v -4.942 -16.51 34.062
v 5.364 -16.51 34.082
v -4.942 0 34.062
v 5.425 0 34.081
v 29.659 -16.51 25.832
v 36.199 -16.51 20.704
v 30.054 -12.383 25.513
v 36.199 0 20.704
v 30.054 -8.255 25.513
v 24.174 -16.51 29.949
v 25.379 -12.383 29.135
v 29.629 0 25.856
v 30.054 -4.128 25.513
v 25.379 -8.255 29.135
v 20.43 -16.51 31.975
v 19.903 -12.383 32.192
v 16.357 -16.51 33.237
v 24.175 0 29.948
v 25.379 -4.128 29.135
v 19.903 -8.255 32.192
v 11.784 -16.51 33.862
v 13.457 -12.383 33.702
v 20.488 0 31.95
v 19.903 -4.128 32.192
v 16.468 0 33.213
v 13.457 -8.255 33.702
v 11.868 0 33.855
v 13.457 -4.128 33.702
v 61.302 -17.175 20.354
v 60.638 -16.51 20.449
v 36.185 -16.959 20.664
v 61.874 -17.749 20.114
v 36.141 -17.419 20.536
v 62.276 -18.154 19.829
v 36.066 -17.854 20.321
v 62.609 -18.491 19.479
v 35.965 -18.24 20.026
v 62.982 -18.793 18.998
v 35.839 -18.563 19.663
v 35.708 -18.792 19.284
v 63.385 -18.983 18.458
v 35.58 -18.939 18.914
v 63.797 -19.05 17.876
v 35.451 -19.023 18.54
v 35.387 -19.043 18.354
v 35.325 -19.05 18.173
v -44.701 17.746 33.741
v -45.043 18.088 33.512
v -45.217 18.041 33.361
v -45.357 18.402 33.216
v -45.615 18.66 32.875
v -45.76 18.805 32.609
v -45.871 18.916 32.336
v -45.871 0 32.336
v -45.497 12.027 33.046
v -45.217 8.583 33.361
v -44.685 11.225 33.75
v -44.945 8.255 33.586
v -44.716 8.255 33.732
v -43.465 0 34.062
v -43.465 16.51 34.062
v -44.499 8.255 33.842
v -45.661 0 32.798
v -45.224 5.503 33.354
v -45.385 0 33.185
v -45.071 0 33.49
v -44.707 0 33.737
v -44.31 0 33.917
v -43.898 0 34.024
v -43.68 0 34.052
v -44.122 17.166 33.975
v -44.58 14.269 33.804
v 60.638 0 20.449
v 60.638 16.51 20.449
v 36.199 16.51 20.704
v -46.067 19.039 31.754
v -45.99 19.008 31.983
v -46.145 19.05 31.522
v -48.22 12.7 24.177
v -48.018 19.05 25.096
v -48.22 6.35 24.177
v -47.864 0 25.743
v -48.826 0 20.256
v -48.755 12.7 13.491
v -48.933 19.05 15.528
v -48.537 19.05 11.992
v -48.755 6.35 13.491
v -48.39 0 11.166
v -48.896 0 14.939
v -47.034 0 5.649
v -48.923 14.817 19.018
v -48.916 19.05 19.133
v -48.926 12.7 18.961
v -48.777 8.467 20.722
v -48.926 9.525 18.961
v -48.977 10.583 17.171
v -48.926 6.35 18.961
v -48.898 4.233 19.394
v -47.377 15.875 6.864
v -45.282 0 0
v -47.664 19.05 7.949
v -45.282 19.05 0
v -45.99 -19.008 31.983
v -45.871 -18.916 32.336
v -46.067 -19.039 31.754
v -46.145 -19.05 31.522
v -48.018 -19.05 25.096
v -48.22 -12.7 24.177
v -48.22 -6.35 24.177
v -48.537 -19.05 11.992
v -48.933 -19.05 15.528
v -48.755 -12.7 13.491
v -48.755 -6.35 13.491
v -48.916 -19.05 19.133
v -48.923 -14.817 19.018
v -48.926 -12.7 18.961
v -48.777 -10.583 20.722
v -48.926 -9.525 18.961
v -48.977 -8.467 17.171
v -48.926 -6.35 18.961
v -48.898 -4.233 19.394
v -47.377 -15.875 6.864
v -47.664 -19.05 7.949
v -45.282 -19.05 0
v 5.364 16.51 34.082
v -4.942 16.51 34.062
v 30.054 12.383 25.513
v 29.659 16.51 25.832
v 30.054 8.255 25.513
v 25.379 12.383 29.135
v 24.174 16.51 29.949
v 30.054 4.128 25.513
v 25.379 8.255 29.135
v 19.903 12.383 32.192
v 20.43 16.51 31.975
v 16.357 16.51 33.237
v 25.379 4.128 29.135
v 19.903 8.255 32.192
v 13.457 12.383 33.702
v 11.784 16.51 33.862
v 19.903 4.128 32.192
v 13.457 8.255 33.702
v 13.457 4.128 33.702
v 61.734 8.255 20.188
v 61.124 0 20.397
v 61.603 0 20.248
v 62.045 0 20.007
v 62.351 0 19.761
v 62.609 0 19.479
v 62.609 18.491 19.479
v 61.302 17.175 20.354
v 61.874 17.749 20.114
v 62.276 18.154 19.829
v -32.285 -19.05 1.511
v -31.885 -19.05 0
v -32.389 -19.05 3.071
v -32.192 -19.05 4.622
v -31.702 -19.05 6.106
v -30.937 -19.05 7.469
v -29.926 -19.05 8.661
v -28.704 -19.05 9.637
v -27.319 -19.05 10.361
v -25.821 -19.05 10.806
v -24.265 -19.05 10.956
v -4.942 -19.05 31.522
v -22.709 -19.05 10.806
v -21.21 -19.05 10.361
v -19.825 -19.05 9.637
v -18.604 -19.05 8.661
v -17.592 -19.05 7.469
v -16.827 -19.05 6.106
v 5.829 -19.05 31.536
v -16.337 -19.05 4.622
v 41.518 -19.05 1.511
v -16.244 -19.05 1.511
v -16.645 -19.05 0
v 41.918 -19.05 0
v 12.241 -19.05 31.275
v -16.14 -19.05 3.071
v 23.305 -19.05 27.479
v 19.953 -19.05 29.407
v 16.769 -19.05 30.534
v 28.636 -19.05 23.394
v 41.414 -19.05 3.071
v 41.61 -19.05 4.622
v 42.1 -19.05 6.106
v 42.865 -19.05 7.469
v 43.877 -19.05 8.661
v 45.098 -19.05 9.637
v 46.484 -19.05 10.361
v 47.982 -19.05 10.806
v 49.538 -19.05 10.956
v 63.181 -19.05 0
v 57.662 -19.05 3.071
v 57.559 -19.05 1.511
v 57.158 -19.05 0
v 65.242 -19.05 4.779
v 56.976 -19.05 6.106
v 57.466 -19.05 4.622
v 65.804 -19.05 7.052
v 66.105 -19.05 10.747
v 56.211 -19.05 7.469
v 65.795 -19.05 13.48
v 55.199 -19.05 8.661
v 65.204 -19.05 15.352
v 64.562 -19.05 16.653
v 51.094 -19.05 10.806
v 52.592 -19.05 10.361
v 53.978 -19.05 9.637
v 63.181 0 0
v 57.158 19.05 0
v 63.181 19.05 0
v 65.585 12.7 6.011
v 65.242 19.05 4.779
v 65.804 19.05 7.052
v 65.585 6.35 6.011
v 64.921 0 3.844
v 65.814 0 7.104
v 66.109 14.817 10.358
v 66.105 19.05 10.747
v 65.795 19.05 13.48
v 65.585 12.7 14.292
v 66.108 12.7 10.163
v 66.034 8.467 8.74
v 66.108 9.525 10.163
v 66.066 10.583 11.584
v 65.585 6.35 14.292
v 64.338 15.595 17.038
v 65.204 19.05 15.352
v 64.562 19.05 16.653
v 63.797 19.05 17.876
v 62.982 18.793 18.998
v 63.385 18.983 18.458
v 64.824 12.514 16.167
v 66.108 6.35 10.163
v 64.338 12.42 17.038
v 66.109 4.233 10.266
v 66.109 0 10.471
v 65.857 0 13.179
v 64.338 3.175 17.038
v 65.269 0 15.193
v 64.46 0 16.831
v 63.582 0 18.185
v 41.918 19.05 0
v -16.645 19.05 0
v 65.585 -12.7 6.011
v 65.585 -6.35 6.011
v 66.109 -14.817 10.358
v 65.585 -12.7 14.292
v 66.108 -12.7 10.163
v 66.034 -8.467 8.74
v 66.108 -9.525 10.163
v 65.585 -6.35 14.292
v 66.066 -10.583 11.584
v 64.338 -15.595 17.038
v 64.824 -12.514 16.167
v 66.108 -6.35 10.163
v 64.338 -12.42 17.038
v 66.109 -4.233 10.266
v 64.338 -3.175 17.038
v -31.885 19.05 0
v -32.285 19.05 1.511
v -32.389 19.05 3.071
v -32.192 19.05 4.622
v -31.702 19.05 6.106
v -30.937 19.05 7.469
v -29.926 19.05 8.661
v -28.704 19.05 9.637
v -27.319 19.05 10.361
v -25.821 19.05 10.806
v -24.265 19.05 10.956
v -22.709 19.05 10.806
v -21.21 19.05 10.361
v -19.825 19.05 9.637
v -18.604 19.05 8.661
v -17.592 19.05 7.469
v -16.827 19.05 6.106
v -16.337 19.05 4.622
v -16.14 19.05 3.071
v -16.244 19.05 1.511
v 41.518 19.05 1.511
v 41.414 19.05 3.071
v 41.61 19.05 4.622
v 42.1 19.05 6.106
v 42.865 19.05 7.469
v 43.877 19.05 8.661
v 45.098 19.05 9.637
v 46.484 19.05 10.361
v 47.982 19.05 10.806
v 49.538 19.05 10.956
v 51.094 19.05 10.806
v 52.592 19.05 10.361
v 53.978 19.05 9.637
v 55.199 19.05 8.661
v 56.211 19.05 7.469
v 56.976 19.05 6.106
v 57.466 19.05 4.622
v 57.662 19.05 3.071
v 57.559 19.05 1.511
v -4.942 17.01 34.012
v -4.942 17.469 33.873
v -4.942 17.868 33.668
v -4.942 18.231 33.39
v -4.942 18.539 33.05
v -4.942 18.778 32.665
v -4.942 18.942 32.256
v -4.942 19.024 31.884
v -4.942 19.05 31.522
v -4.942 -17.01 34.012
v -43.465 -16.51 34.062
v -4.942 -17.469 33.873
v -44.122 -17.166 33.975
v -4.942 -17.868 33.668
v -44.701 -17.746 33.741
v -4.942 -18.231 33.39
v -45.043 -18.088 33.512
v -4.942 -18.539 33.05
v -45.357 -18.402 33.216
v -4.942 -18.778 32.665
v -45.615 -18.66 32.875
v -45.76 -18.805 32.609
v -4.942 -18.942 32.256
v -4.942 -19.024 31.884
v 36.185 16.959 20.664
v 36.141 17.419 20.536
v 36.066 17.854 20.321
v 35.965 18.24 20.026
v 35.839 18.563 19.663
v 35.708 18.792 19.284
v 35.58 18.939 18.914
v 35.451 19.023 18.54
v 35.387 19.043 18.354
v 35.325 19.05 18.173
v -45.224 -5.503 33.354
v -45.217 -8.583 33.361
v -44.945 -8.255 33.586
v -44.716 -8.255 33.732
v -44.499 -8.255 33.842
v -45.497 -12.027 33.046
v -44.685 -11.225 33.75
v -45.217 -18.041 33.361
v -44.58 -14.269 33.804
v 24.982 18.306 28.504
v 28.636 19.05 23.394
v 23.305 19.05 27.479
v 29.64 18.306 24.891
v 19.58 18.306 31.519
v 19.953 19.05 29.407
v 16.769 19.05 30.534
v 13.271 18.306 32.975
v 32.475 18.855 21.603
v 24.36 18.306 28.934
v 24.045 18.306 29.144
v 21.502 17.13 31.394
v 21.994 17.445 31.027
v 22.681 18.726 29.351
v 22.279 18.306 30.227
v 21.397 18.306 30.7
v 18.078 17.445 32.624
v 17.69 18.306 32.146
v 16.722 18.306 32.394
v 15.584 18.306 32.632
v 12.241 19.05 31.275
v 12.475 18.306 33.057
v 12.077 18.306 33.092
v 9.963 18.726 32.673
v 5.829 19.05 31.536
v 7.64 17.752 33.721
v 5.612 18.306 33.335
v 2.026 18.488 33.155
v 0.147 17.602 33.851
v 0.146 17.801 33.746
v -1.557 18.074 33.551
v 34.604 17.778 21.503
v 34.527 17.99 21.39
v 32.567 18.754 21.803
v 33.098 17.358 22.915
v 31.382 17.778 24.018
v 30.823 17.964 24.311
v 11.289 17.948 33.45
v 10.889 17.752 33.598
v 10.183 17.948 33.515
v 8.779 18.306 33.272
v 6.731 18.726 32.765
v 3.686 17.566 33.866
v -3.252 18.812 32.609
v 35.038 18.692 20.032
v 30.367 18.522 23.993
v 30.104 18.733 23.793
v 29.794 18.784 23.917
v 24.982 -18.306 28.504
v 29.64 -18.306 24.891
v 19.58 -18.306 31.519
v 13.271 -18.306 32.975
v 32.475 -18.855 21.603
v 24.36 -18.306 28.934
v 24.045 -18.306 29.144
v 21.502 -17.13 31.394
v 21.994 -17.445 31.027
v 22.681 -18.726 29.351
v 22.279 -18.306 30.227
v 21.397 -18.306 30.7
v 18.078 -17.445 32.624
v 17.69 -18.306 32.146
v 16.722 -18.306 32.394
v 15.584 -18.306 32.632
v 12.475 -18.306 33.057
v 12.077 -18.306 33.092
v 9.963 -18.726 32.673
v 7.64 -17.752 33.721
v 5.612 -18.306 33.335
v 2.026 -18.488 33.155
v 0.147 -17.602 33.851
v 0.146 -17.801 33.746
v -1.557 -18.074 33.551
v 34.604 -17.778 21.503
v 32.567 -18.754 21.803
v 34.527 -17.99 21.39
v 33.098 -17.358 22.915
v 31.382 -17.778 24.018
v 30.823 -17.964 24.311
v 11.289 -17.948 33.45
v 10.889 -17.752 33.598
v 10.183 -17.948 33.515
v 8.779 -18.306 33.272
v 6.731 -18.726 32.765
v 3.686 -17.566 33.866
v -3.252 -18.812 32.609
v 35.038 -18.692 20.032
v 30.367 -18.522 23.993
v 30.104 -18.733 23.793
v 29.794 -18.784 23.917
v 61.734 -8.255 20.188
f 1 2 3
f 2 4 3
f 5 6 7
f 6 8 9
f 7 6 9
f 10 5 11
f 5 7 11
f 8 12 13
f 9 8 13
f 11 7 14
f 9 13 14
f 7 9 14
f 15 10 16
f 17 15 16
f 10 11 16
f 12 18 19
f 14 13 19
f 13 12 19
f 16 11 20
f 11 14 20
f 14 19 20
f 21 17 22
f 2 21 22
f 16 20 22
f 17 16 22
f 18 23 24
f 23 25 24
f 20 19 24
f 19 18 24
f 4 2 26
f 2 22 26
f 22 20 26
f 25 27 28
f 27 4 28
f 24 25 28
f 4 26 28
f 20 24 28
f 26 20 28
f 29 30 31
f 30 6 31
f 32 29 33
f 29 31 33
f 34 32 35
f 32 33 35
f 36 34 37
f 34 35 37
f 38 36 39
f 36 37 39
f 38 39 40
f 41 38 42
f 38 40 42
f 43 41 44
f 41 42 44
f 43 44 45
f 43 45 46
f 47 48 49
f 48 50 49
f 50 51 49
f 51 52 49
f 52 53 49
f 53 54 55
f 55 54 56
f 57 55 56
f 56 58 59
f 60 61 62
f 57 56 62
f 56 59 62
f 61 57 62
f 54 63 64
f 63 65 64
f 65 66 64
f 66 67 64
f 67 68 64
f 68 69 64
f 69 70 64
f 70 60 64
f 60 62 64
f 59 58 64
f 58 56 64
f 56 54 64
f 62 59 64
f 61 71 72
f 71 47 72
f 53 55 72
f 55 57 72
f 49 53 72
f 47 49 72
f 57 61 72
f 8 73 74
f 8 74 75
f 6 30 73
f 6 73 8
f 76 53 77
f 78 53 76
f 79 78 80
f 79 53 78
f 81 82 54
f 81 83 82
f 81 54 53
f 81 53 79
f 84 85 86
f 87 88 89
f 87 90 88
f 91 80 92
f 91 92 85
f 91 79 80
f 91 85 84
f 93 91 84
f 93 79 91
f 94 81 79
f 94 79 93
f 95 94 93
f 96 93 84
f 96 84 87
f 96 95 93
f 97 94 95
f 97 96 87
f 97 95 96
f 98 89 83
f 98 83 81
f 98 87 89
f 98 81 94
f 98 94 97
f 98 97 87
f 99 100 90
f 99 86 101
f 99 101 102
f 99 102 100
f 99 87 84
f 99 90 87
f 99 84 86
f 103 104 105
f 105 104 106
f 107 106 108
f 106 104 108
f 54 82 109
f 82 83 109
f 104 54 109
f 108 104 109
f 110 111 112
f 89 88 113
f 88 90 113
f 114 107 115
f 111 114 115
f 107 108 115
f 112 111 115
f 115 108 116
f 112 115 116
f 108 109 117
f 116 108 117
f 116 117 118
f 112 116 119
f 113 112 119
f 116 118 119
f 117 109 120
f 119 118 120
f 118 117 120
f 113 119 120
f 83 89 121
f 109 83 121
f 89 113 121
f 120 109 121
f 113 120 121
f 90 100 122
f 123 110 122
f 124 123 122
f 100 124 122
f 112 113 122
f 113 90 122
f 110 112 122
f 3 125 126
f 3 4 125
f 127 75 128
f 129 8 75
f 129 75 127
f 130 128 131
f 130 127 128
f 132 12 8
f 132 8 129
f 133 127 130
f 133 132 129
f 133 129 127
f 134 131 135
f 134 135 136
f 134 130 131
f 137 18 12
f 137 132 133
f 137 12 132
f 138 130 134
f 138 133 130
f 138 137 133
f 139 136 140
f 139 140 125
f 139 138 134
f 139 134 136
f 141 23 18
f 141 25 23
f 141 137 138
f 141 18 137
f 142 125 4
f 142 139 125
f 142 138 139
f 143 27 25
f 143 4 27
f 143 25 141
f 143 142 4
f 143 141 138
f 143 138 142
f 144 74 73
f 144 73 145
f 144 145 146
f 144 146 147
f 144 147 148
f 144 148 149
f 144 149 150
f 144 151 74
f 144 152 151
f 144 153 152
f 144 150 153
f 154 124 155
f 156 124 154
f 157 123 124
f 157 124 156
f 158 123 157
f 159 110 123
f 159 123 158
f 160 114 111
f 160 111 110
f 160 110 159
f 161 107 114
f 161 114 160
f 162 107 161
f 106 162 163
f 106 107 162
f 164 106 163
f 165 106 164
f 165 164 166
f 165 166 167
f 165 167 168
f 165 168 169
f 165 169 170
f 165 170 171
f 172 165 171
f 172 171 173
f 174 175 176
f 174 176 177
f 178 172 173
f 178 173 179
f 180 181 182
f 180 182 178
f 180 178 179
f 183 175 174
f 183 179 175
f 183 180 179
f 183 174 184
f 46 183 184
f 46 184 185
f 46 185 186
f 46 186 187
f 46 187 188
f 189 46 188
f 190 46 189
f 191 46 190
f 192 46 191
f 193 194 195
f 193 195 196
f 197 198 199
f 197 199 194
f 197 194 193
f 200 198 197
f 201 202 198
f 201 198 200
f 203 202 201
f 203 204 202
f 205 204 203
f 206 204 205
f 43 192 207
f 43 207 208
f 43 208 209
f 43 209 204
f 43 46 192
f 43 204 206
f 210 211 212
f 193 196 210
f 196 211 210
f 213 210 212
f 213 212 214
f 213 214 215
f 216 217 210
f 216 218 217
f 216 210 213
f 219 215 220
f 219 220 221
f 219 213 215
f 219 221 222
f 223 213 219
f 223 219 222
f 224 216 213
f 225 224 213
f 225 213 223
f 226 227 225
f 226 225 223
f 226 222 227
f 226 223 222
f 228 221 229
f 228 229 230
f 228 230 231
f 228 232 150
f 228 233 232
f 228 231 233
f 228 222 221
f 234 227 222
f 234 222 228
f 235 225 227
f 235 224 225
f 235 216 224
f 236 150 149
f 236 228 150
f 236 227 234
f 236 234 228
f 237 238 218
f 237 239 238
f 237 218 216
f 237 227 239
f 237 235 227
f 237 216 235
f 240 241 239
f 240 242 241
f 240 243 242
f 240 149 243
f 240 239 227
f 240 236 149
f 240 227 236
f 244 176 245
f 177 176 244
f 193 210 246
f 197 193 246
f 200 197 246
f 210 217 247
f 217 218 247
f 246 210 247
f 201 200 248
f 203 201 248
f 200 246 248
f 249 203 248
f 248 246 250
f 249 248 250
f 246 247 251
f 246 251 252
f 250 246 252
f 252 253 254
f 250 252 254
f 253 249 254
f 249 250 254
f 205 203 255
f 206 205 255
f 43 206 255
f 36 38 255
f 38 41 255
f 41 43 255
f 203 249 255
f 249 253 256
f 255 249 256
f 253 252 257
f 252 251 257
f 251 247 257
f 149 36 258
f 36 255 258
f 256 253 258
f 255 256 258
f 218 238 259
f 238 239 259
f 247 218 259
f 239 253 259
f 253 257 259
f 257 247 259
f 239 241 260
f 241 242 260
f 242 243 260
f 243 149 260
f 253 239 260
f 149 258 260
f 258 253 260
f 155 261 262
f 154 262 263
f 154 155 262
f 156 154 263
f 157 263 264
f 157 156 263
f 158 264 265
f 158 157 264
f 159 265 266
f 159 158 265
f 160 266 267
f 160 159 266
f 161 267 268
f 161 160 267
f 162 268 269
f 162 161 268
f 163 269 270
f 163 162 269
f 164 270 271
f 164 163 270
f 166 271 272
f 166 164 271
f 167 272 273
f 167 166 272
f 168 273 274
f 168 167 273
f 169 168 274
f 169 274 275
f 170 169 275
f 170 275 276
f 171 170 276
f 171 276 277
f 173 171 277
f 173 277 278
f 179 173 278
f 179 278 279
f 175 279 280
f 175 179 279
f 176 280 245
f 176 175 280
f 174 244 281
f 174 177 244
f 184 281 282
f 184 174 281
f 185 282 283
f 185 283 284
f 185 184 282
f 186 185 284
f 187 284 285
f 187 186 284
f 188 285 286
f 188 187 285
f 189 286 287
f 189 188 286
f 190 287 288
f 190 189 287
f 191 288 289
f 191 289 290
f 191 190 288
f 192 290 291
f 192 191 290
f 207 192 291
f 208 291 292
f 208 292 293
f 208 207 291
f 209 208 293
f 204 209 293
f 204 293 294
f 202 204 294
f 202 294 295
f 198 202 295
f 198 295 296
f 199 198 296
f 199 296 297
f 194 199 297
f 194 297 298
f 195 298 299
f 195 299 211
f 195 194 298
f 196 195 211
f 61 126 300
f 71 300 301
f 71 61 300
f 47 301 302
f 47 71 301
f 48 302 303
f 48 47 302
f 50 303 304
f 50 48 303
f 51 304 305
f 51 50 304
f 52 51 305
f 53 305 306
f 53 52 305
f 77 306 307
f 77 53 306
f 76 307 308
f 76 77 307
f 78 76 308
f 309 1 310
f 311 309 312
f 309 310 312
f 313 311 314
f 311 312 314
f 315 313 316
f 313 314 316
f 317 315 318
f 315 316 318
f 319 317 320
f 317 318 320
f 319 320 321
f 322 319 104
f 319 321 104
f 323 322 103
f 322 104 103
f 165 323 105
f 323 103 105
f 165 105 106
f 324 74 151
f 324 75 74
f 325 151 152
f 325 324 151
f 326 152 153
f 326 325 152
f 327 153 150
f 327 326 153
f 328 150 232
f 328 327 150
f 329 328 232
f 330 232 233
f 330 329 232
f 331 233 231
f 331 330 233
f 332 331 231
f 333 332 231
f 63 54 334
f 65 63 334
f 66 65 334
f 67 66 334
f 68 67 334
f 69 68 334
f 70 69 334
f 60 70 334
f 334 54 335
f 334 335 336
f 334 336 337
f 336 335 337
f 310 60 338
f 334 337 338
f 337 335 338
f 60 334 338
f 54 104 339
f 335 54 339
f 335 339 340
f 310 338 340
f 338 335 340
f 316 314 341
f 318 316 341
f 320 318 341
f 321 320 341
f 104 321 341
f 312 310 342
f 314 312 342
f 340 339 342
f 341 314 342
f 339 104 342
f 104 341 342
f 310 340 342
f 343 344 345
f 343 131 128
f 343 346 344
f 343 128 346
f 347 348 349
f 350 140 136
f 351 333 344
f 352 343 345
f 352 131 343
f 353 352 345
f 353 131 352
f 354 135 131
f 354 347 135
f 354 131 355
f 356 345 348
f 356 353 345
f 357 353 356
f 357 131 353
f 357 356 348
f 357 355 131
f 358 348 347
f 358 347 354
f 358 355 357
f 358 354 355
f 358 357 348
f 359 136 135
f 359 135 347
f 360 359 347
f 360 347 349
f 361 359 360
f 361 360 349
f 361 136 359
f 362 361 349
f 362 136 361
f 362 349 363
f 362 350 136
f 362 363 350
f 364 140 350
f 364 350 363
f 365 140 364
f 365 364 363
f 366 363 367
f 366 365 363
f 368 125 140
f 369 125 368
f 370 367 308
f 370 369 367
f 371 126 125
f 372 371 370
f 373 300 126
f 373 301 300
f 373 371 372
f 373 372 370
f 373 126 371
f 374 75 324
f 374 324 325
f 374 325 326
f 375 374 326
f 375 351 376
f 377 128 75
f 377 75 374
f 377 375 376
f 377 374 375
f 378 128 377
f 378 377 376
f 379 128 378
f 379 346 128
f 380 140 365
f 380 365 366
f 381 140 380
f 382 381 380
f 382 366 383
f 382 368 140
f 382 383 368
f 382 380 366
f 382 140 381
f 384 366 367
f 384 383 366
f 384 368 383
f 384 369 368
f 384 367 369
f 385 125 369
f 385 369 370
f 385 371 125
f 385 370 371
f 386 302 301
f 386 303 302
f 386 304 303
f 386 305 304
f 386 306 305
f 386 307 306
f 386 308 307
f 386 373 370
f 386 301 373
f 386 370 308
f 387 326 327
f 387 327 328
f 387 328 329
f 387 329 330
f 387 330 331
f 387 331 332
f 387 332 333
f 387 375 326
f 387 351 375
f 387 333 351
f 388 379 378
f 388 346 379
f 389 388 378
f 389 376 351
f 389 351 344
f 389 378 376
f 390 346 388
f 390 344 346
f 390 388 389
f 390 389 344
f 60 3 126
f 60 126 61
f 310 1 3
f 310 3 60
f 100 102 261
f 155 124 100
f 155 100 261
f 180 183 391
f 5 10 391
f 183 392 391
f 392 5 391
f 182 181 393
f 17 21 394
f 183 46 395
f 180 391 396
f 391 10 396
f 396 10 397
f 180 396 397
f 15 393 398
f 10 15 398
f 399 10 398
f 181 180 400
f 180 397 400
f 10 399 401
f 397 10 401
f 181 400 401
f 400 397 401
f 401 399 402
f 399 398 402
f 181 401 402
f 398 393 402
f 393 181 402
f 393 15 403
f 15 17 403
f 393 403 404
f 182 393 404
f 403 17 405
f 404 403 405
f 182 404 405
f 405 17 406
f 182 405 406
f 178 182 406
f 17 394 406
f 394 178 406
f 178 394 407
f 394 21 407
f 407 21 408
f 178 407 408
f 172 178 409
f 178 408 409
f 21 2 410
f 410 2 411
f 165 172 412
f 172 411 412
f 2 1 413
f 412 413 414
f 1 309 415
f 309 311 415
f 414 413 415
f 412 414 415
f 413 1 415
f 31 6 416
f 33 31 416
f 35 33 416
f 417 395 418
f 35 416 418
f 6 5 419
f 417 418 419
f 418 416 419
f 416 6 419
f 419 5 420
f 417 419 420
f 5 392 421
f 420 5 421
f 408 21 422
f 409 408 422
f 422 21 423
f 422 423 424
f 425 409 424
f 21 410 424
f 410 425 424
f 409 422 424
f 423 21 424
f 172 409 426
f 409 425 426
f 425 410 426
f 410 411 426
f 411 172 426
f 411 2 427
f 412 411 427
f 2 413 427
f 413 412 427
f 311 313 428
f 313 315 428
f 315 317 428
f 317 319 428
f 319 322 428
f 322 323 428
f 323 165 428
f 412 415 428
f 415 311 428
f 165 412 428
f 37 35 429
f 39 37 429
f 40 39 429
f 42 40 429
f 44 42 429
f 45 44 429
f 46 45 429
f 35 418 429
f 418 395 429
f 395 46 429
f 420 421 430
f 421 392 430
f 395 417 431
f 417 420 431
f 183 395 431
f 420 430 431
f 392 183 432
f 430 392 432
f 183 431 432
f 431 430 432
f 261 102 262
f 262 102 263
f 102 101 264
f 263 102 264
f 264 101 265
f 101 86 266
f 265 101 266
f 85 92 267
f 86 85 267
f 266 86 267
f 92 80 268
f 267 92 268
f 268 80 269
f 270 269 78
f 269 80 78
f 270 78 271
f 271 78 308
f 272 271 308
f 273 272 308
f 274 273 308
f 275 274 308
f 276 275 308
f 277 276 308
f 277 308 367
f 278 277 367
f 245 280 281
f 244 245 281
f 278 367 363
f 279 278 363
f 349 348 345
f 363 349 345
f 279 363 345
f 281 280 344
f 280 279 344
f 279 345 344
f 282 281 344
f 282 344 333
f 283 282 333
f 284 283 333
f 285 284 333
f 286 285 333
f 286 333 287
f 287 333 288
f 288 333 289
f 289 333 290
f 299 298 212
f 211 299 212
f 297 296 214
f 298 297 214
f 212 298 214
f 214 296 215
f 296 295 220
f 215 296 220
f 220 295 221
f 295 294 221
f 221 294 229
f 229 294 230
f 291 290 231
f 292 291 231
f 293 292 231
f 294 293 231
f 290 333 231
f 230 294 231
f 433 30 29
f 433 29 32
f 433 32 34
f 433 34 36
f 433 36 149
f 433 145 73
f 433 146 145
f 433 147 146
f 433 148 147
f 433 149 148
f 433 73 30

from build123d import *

# Parameters (mm, degrees)
F1_DEPTH = 19.05
F2_R     = 2.54


# Not quite as in the source:
# - a feature of the source that left no trace in its solid (it failed there, or was rolled back) is left out
# - the program builds the solid bodies; features that only make, move or delete a surface that nothing else refers to are left out


with BuildPart() as f1:
    # F0 (on Front) → F1 (new body, symmetric)
    with BuildSketch(Plane.XZ):
        with BuildLine():
            Line((57.1580786184, 0), (63.1808337388, 0))
            add(Edge.make_bspline(
                [(63.1808337388, 0), (64.1070753603, 1.8610503512), (66.0809264552, 5.8270093279), (66.4899415159, 14.6578153912), (63.3565966702, 18.5563140043), (61.8450880558, 20.4369286596)],
                knots=[0, 0, 0, 0, 0.3139594033, 0.669057725, 1, 1, 1, 1], degree=3))
            Line((61.8450880558, 20.4369286596), (36.198740513, 20.7040771047))
            add(Edge.make_bspline(
                [(36.198740513, 20.7040771047), (34.2669116908, 22.189306267), (29.9242250959, 25.5280517601), (20.2820782894, 33.6171914647), (6.7709379775, 34.1670870206), (-1.1152122764, 34.0960294227), (-4.942264819, 34.0615460371)],
                knots=[0, 0, 0, 0, 0.2093274169, 0.4705610335, 0.7430697263, 1, 1, 1, 1], degree=3))
            Line((-4.942264819, 34.0615460371), (-45.2818187647, 34.0615460371))
            add(Edge.make_bspline(
                [(-45.2818187647, 34.0615460371), (-46.4011998646, 30.7970228492), (-48.6607847814, 24.2072498428), (-49.5278252711, 13.2391089732), (-46.7579858308, 4.6027100105), (-45.2818187647, 0)],
                knots=[0, 0, 0, 0, 0.3143769013, 0.6346018389, 1, 1, 1, 1], degree=3))
            Line((-45.2818187647, 0), (-31.8846153722, 0))
            ThreePointArc((-31.8846153722, 0), (-24.2646153722, 10.9564242963), (-16.6446153722, 0))
            Line((-16.6446153722, 0), (41.9180786184, 0))
            ThreePointArc((41.9180786184, 0), (49.5380786184, 10.9564242963), (57.1580786184, 0))
        make_face()
    extrude(amount=F1_DEPTH, both=True)

    # F2
    f2_edges = [f1.edges().sort_by_distance(p)[0] for p in [
        (49.021914, -19.05, 20.570503),
        (49.021914, 19.05, 20.570503),
        (61.845088, 9.525, 20.436929),
        (61.845088, -9.525, 20.436929),
        (17.503149, -19.05, 32.967083),
        (17.503149, 19.05, 32.967083),
        (-45.281819, -9.525, 34.061546),
        (-45.281819, 9.525, 34.061546),
        (-25.112042, 19.05, 34.061546),
        (-25.112042, -19.05, 34.061546),
    ]]
    fillet(f2_edges, radius=F2_R)


solid = f1.part
